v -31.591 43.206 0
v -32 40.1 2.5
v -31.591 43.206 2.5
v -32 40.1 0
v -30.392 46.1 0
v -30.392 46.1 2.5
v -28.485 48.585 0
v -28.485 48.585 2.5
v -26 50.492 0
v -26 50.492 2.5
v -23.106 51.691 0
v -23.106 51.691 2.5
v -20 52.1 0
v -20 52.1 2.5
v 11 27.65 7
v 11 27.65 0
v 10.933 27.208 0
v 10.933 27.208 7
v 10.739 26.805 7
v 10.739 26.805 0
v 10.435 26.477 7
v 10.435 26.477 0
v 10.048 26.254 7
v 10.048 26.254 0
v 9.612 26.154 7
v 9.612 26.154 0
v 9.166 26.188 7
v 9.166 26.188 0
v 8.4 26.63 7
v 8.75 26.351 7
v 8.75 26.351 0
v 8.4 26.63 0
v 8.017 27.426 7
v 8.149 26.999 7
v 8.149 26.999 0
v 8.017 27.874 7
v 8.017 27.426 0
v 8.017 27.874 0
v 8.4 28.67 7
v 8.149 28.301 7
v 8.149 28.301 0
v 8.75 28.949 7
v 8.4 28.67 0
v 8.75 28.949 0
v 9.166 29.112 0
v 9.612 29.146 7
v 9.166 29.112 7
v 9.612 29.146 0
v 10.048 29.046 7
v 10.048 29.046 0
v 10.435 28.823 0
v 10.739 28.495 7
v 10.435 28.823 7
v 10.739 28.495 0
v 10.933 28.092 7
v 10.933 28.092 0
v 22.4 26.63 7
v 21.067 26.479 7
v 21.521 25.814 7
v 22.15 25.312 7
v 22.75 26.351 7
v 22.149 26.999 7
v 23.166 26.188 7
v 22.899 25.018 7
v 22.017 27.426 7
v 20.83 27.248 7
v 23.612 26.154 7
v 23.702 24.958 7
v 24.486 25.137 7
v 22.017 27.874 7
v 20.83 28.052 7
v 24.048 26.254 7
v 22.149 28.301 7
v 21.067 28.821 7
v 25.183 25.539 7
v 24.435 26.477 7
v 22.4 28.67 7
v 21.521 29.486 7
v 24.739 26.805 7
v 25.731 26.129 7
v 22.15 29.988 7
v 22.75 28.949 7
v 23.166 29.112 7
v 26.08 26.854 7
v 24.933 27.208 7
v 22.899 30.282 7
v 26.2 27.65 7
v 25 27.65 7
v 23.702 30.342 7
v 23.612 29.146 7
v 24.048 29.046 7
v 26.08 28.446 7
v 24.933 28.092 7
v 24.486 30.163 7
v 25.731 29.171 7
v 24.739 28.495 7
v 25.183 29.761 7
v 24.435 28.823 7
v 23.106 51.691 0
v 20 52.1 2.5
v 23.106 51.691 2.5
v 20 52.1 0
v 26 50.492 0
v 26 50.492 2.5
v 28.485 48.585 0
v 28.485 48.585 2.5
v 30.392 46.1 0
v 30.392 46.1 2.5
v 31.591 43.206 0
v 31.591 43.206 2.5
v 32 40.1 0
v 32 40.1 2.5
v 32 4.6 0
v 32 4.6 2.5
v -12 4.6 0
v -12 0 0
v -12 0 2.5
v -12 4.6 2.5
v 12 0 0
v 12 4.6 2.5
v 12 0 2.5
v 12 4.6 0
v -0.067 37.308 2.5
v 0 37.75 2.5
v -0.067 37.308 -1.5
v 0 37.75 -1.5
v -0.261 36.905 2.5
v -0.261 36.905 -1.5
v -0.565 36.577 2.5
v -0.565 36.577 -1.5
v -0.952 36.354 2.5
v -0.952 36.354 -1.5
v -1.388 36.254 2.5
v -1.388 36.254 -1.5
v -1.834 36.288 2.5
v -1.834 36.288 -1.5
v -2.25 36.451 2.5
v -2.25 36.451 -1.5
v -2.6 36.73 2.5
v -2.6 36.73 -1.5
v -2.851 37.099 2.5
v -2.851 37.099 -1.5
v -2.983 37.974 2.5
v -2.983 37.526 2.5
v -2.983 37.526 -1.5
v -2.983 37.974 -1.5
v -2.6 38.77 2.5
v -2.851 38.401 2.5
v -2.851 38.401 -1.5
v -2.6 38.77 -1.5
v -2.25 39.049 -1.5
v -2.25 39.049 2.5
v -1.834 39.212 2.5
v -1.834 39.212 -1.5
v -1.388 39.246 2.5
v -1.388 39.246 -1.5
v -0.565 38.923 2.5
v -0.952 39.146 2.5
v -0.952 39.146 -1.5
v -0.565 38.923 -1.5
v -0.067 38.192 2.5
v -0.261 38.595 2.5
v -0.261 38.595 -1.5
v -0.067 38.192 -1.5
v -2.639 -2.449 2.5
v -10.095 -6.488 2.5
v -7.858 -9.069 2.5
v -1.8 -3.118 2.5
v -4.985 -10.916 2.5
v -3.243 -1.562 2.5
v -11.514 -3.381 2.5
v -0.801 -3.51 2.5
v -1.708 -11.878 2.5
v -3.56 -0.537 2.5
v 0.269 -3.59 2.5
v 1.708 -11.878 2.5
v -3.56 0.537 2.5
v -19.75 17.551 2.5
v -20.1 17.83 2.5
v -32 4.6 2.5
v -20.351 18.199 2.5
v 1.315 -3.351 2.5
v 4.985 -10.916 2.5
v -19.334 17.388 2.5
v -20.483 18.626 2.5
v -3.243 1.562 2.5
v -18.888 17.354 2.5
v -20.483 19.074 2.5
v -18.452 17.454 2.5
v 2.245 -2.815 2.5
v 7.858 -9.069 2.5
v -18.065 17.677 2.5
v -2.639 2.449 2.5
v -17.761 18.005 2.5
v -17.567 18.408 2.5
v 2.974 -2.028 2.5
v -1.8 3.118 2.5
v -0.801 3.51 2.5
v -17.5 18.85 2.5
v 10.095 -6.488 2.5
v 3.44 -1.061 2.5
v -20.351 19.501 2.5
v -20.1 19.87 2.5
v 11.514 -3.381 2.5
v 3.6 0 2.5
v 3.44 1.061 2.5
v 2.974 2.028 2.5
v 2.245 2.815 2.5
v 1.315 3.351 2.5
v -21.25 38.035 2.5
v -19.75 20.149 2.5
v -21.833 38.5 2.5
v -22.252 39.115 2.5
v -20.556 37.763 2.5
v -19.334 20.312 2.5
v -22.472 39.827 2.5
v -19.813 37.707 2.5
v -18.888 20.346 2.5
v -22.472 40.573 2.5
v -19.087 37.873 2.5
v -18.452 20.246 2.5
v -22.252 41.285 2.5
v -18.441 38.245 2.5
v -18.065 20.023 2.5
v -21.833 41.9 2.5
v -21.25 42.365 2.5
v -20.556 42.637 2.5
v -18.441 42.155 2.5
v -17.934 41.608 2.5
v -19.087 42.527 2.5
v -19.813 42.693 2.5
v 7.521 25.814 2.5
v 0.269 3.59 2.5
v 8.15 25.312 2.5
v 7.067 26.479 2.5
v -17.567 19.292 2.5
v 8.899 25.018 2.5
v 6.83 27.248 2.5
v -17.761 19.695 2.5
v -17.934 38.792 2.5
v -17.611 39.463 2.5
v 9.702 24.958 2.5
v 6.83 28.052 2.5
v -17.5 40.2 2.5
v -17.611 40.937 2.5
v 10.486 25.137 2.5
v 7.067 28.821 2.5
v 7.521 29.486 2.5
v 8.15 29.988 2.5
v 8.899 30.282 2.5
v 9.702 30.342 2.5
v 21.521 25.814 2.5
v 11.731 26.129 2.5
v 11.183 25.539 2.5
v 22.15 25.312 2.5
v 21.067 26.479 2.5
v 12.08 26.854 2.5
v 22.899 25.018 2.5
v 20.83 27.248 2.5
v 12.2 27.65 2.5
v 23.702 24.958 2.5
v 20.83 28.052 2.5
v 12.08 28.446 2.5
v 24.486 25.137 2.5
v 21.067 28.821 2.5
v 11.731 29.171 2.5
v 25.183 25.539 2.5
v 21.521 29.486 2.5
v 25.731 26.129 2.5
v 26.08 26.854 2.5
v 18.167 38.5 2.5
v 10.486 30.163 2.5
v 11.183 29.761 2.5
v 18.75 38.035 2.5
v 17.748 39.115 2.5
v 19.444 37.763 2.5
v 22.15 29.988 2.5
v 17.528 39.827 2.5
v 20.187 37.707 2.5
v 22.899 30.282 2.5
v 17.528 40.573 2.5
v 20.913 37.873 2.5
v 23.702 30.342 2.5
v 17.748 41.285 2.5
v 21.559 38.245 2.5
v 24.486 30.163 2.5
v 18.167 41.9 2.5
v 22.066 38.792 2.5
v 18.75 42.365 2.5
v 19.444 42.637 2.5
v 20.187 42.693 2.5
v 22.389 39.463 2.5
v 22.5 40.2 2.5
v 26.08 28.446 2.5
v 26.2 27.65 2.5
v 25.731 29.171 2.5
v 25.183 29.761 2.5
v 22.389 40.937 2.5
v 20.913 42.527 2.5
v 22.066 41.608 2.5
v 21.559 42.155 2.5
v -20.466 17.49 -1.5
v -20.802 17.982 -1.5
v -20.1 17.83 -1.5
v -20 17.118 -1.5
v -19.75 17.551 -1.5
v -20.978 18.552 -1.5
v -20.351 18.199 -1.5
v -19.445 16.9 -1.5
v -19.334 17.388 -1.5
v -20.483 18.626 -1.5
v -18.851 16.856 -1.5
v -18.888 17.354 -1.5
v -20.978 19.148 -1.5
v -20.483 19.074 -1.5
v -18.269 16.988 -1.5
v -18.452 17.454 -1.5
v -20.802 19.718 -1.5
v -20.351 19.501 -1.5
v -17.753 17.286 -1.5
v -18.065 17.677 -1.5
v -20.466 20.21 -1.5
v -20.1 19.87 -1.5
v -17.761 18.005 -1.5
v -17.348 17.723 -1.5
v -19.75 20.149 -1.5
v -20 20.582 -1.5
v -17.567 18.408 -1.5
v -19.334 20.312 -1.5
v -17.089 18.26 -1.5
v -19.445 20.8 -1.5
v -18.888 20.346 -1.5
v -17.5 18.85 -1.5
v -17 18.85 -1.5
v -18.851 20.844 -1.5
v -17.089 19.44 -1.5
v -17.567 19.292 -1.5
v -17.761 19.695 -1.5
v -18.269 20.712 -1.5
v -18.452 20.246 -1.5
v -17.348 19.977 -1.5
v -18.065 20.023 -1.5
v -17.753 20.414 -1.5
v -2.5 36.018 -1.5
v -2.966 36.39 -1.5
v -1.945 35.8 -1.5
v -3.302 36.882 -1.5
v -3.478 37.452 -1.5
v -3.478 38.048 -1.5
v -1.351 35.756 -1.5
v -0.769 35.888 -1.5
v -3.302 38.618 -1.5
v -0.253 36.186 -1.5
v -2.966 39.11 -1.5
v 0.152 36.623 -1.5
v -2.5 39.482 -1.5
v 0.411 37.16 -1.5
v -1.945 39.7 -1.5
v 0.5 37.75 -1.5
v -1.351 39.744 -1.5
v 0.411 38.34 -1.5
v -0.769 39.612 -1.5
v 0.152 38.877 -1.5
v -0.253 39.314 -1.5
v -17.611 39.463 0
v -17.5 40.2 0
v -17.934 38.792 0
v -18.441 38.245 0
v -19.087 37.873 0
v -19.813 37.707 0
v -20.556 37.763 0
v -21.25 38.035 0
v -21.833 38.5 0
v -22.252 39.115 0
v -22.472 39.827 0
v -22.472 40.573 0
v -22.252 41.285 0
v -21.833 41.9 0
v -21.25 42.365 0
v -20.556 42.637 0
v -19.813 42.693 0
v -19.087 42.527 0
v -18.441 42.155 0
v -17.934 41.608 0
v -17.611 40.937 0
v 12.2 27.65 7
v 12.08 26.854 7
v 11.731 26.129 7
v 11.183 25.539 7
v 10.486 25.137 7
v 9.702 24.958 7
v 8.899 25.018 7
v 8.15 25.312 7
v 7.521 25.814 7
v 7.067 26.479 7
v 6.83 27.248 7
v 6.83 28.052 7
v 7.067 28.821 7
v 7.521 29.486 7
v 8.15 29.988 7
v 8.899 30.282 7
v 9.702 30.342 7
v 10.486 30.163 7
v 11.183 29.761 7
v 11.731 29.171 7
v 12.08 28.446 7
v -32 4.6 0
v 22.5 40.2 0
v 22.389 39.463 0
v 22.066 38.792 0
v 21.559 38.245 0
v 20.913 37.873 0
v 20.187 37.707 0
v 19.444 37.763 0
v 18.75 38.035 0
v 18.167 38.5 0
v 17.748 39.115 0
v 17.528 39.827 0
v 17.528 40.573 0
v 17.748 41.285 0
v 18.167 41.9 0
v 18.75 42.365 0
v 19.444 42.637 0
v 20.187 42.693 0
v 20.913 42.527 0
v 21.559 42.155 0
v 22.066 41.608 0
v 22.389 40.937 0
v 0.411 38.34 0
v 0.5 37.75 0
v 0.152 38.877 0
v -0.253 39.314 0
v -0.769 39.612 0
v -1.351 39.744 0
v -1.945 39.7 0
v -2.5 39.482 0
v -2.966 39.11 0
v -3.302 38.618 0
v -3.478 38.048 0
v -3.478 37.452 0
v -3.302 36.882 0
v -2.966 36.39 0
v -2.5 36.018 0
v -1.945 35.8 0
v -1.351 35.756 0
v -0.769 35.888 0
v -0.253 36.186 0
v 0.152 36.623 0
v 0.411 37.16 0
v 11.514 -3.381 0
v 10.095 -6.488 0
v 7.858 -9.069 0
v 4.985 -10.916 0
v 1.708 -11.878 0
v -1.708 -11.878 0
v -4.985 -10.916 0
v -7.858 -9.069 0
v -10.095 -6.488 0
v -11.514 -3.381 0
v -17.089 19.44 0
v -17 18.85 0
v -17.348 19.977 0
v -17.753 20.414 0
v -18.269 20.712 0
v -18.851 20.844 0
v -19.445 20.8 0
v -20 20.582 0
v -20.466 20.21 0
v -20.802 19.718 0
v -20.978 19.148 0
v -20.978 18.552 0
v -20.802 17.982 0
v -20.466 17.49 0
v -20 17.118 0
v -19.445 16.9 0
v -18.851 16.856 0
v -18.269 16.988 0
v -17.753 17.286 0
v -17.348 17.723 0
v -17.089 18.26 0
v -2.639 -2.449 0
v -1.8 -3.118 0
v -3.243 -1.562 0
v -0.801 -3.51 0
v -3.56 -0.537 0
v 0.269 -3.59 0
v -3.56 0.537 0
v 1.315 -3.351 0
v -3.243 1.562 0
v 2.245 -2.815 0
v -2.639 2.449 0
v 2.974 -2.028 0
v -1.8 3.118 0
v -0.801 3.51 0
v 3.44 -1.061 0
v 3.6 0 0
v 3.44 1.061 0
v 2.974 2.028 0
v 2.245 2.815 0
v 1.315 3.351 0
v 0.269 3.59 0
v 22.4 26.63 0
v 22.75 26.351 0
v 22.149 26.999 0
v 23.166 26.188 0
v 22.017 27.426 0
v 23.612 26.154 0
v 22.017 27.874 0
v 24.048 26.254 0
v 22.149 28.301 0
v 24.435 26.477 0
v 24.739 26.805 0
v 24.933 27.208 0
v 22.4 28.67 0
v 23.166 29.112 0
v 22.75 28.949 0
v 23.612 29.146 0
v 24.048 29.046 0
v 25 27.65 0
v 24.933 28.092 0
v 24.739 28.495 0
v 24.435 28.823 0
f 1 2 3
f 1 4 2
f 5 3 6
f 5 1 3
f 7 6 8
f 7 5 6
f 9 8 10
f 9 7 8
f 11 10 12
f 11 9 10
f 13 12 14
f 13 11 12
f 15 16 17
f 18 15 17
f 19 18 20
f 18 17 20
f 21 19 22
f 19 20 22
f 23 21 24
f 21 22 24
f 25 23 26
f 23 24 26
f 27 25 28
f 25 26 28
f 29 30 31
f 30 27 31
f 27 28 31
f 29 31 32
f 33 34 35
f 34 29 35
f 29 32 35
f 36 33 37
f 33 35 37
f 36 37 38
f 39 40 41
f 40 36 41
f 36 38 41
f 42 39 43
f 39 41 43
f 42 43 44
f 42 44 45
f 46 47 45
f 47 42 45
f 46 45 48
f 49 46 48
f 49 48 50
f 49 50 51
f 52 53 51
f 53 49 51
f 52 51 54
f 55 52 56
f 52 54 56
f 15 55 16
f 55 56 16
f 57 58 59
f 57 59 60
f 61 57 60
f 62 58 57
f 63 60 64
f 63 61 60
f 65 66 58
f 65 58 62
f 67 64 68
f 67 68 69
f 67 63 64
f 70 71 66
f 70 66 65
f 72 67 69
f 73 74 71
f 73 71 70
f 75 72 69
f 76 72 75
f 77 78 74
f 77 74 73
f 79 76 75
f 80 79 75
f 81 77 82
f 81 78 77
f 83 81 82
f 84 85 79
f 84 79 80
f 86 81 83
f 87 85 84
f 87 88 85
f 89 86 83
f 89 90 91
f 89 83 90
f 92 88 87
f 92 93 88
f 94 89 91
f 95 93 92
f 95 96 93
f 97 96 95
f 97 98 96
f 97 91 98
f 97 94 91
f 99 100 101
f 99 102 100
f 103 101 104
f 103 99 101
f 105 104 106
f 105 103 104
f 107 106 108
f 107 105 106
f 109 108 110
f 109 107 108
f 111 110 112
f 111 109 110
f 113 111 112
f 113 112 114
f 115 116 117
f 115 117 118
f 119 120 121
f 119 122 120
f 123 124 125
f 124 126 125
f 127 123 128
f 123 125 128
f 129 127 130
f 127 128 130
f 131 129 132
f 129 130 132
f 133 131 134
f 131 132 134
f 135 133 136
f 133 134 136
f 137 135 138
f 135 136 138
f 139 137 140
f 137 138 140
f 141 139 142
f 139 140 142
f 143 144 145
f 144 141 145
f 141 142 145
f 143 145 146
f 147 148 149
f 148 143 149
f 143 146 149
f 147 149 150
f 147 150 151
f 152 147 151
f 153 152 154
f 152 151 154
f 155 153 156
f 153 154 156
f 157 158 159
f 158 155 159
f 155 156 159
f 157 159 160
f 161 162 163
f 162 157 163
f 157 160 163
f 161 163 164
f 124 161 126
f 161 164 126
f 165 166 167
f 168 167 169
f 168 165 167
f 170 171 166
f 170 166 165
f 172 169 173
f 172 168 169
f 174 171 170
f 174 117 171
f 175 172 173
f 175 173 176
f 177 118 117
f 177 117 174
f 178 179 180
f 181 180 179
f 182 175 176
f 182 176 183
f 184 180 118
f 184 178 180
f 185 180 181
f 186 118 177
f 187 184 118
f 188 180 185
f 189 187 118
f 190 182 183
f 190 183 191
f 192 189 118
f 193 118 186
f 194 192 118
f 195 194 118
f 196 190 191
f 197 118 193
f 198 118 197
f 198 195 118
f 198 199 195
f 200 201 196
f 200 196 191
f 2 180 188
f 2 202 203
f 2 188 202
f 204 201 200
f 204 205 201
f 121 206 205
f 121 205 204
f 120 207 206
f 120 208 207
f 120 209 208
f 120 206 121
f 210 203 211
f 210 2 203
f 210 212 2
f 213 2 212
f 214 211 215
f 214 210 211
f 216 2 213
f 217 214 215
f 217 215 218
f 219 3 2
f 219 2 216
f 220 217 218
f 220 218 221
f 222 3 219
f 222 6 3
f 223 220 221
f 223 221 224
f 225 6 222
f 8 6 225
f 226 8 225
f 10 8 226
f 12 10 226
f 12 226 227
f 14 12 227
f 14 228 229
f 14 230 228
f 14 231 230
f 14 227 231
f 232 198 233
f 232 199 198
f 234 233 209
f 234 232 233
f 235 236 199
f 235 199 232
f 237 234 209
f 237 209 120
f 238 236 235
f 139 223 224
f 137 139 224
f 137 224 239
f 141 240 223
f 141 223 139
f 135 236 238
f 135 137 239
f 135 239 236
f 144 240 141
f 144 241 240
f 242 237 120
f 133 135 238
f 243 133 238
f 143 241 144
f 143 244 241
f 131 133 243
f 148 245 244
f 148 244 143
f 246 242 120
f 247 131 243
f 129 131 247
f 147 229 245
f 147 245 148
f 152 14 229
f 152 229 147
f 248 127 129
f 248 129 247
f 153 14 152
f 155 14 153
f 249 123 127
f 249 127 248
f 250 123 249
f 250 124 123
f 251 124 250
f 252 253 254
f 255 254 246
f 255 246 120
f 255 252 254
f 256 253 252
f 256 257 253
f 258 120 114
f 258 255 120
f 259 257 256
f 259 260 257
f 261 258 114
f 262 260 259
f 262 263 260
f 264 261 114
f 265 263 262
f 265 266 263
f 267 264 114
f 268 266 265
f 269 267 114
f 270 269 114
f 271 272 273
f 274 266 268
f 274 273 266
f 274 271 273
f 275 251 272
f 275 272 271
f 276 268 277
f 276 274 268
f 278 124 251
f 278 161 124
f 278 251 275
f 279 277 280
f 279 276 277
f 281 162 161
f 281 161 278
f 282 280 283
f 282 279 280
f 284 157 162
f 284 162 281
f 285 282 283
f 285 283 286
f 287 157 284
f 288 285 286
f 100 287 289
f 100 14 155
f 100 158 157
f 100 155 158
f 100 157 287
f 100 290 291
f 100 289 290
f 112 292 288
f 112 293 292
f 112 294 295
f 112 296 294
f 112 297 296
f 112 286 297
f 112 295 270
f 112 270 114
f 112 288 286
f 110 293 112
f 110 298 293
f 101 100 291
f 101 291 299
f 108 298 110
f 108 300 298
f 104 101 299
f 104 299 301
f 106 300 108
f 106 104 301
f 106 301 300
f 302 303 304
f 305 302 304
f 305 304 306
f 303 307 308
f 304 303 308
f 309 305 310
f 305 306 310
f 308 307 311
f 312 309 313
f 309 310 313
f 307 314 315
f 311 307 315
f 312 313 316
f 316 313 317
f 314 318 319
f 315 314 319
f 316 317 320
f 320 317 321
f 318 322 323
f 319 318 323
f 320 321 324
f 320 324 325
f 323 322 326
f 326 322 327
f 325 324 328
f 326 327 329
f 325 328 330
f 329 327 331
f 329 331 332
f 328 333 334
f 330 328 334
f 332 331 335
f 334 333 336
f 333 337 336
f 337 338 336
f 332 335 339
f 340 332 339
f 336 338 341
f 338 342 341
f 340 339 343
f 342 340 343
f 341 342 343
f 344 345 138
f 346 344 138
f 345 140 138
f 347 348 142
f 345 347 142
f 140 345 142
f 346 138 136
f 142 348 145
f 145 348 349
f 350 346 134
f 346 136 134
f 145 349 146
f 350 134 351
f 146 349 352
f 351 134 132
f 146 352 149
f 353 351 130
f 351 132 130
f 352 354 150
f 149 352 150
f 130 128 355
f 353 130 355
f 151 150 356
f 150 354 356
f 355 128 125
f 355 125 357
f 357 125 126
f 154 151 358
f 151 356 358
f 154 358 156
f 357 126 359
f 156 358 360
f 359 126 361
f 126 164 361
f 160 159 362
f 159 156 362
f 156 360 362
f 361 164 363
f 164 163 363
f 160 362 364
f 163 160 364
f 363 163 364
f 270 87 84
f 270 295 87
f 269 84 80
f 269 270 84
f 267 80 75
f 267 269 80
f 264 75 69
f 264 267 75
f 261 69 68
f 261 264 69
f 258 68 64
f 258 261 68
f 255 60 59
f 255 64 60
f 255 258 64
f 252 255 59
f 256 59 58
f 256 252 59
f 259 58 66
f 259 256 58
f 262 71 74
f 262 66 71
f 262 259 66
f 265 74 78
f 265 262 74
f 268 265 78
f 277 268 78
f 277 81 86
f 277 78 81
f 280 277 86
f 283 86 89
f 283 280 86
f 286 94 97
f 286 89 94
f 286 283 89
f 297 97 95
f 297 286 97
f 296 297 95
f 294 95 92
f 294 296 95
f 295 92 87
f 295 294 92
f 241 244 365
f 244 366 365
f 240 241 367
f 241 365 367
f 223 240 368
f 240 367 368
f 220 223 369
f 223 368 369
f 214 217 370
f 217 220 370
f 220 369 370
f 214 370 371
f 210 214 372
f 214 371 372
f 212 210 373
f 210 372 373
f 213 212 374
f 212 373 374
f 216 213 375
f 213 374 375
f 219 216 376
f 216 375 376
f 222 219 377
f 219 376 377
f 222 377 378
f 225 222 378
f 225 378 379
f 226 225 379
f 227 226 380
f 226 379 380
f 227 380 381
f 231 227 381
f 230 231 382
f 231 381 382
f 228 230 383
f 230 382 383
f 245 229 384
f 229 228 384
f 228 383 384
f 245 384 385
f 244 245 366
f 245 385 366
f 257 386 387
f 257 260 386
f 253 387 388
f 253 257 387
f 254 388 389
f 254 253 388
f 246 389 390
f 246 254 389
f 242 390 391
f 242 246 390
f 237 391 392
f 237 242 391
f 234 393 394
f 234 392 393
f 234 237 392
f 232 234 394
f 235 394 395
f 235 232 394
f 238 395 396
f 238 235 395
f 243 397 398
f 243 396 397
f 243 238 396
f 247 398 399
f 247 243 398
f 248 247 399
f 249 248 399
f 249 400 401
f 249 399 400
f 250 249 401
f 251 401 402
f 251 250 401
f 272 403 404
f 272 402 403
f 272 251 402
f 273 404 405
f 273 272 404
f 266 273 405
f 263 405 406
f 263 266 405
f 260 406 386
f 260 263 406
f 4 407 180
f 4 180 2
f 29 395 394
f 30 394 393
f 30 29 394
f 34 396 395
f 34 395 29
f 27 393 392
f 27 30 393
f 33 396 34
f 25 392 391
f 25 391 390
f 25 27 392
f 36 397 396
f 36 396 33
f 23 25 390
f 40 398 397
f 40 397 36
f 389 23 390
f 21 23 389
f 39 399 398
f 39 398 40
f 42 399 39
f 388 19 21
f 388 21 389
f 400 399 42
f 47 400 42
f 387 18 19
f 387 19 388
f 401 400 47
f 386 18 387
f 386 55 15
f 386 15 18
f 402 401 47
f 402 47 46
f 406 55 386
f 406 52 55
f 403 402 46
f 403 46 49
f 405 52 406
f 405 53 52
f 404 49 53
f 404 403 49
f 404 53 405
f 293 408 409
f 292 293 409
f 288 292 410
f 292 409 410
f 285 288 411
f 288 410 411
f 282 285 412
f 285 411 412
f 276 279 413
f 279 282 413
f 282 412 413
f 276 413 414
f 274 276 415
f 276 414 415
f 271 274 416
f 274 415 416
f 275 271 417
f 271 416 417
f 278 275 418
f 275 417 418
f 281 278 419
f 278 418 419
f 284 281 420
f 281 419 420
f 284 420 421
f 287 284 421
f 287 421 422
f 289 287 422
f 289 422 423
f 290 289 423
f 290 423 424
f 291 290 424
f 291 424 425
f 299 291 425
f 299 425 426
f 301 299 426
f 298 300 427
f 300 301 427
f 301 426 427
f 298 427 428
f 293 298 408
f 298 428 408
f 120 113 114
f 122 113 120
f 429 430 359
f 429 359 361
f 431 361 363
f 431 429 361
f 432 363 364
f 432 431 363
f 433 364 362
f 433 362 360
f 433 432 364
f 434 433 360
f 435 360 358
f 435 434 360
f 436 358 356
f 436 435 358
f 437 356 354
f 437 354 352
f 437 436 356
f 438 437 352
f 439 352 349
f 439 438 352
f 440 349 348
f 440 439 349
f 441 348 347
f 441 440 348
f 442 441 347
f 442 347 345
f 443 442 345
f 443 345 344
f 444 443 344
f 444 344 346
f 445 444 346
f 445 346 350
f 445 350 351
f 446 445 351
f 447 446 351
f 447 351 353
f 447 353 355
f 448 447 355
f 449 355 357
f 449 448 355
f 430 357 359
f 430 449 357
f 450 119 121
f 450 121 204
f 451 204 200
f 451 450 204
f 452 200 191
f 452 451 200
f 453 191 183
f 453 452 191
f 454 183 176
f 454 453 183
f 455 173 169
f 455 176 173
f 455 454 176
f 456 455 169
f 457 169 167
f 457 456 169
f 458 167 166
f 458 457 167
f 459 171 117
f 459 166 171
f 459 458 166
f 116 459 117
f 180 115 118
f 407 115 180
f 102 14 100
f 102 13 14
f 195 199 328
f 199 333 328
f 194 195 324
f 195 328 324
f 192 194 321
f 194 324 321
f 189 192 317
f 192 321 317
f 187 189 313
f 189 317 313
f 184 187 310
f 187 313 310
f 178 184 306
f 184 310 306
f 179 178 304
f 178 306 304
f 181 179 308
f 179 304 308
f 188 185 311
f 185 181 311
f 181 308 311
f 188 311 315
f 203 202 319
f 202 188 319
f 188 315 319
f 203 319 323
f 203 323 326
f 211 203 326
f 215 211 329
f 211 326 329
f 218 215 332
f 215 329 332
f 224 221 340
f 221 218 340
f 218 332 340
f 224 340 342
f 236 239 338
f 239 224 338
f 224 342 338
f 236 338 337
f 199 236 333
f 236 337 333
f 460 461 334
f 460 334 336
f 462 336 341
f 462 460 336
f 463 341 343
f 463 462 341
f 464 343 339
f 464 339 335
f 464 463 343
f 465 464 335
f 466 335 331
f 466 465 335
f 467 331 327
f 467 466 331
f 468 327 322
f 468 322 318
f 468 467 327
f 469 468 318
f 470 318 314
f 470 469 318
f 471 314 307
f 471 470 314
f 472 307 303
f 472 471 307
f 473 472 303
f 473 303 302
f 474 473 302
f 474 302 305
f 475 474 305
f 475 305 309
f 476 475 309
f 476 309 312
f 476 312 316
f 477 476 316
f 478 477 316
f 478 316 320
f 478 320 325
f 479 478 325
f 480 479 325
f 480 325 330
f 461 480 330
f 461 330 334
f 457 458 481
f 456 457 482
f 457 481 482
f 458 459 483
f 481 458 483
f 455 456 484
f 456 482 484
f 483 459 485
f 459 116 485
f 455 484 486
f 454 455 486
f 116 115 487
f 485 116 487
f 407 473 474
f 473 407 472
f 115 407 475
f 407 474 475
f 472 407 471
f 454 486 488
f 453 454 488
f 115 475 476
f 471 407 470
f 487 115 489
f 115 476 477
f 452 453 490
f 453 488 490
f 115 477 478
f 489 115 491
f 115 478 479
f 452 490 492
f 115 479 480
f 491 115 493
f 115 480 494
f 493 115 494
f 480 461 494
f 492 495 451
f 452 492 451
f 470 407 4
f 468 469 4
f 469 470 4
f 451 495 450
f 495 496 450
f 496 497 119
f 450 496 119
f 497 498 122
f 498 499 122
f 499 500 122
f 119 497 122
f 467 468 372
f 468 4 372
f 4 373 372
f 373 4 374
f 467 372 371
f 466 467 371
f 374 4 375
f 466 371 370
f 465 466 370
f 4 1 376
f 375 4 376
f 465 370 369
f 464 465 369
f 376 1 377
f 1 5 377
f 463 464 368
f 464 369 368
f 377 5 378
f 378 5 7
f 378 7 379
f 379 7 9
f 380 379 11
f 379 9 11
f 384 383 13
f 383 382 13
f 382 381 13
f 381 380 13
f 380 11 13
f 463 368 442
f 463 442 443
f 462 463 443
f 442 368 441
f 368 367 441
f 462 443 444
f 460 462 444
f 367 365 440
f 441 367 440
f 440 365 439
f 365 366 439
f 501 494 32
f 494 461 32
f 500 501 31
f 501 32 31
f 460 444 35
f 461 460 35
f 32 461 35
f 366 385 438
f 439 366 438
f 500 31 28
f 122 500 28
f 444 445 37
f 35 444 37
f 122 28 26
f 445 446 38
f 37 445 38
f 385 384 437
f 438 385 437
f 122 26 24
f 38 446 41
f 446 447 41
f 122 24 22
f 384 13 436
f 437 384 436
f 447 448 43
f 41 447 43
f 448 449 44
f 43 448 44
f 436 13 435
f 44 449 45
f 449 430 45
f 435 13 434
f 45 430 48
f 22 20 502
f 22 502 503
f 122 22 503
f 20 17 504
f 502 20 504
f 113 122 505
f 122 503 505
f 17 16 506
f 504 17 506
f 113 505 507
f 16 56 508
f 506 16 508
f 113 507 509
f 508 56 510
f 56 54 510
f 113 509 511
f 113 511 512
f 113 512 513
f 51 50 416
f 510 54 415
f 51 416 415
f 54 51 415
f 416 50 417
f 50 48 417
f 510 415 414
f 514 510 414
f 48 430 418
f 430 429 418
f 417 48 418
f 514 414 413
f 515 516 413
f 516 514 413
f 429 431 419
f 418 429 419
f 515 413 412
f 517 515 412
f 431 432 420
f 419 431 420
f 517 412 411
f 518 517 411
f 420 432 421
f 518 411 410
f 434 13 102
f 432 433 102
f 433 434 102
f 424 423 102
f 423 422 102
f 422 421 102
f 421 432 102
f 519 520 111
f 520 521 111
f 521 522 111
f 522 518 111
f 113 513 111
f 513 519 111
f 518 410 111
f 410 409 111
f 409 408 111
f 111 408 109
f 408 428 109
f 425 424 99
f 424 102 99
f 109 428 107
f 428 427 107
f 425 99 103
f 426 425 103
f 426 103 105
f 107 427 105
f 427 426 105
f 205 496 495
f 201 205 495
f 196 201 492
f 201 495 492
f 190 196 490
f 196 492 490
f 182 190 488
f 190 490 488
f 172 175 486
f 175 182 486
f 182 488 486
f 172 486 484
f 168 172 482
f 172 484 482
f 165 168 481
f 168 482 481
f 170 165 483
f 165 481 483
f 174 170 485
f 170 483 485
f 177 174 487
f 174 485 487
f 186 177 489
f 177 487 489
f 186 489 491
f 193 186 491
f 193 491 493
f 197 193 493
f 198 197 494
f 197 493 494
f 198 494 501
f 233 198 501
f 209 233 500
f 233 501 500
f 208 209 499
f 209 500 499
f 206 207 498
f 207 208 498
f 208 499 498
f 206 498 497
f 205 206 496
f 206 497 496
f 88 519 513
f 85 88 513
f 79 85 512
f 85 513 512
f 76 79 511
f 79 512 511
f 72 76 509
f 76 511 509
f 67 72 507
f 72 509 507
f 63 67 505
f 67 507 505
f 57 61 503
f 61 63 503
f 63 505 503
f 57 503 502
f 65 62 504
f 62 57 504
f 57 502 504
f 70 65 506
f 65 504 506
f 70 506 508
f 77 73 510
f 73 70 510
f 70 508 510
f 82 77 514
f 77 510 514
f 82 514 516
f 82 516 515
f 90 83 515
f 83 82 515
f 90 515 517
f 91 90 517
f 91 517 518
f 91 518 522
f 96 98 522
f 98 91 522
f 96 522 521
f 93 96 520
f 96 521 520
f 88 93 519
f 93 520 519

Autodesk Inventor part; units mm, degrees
ref_plane "YZ Plane" through (0, 0, 0) normal (1, 0, 0) x (0, 1, 0)
ref_plane "XZ Plane" through (0, 0, 0) normal (0, 1, 0) x (-1, 0, 0)
ref_plane "XY Plane" through (0, 0, 0) normal (0, 0, 1) x (1, 0, 0)
sketch "Sketch1" plane through (0, 0, 0) normal (0, 0, 1) x (1, 0, 0)
  circle A0 centre (0, 0) radius 3.6
  line L0 (32, 4.6) -> (12, 4.6)
  line L1 (-32, 4.6) -> (-32, 40.1)
  line L2 (-20, 52.1) -> (20, 52.1)
  line L3 (32, 40.1) -> (32, 4.6)
  circle A1 centre (-19, 18.85) radius 2
  circle A2 centre (-1.5, 37.75) radius 2
  circle A3 centre (9.5, 27.65) radius 1.5
  circle A4 centre (23.5, 27.65) radius 1.5
  circle A5 centre (9.5, 27.65) radius 2.7
  circle A6 centre (23.5, 27.65) radius 2.7
  circle A7 centre (-20, 40.2) radius 2.5
  circle A8 centre (-19, 18.85) radius 1.5
  circle A9 centre (-1.5, 37.75) radius 1.5
  circle A10 centre (20, 40.2) radius 2.5
  arc A11 (-20, 52.1) -> (-32, 40.1) centre (-20, 40.1) ccw
  arc A12 (32, 40.1) -> (20, 52.1) centre (20, 40.1) ccw
  arc A13 (-12, 0) -> (12, 0) centre (0, 0) ccw
  line L4 (-12, 0) -> (-12, 4.6)
  line L5 (12, 4.6) -> (12, 0)
  line L6 (-12, 4.6) -> (-32, 4.6)
  point P0 (-32, 52.1)
  dimension "d0" = 7.2
  dimension "d1" = 52.1
  dimension "d2" = 4.6
  dimension "d3" = 32
  dimension "d4" = 32
  dimension "d5" = 4
  dimension "d6" = 33.25
  dimension "d7" = 19
  dimension "d8" = 4
  dimension "d9" = 1.5
  dimension "d10" = 14.35
  dimension "d11" = 3
  dimension "d12" = 9.5
  dimension "d13" = 24.45
  dimension "d14" = 3
  dimension "d15" = 23.5
  dimension "d16" = 1.2
  dimension "d17" = 1.2
  dimension "d18" = 20
  dimension "d19" = 11.9
  dimension "d20" = 5
  dimension "d21" = 3
  dimension "d22" = 3
  dimension "d23" = 5
  dimension "d24" = 20
  dimension "d25" = 12
  dimension "d27" = 12
extrude "Extrusion1" add sketch "Sketch1" along normal blind 2.5 contours L0 L5 A13 L4 L6 L1 A11 L2 A12 L3
extrude "Extrusion2" add sketch "Sketch1" along normal blind 7 contours A5 | A6
extrude "Extrusion3" add sketch "Sketch1" along normal blind 2.5 and the other way blind 1.5 contours A1 | A2
properties part number "ENDER 3 E_PLATE" material "Steel, High Strength, Low Alloy"
